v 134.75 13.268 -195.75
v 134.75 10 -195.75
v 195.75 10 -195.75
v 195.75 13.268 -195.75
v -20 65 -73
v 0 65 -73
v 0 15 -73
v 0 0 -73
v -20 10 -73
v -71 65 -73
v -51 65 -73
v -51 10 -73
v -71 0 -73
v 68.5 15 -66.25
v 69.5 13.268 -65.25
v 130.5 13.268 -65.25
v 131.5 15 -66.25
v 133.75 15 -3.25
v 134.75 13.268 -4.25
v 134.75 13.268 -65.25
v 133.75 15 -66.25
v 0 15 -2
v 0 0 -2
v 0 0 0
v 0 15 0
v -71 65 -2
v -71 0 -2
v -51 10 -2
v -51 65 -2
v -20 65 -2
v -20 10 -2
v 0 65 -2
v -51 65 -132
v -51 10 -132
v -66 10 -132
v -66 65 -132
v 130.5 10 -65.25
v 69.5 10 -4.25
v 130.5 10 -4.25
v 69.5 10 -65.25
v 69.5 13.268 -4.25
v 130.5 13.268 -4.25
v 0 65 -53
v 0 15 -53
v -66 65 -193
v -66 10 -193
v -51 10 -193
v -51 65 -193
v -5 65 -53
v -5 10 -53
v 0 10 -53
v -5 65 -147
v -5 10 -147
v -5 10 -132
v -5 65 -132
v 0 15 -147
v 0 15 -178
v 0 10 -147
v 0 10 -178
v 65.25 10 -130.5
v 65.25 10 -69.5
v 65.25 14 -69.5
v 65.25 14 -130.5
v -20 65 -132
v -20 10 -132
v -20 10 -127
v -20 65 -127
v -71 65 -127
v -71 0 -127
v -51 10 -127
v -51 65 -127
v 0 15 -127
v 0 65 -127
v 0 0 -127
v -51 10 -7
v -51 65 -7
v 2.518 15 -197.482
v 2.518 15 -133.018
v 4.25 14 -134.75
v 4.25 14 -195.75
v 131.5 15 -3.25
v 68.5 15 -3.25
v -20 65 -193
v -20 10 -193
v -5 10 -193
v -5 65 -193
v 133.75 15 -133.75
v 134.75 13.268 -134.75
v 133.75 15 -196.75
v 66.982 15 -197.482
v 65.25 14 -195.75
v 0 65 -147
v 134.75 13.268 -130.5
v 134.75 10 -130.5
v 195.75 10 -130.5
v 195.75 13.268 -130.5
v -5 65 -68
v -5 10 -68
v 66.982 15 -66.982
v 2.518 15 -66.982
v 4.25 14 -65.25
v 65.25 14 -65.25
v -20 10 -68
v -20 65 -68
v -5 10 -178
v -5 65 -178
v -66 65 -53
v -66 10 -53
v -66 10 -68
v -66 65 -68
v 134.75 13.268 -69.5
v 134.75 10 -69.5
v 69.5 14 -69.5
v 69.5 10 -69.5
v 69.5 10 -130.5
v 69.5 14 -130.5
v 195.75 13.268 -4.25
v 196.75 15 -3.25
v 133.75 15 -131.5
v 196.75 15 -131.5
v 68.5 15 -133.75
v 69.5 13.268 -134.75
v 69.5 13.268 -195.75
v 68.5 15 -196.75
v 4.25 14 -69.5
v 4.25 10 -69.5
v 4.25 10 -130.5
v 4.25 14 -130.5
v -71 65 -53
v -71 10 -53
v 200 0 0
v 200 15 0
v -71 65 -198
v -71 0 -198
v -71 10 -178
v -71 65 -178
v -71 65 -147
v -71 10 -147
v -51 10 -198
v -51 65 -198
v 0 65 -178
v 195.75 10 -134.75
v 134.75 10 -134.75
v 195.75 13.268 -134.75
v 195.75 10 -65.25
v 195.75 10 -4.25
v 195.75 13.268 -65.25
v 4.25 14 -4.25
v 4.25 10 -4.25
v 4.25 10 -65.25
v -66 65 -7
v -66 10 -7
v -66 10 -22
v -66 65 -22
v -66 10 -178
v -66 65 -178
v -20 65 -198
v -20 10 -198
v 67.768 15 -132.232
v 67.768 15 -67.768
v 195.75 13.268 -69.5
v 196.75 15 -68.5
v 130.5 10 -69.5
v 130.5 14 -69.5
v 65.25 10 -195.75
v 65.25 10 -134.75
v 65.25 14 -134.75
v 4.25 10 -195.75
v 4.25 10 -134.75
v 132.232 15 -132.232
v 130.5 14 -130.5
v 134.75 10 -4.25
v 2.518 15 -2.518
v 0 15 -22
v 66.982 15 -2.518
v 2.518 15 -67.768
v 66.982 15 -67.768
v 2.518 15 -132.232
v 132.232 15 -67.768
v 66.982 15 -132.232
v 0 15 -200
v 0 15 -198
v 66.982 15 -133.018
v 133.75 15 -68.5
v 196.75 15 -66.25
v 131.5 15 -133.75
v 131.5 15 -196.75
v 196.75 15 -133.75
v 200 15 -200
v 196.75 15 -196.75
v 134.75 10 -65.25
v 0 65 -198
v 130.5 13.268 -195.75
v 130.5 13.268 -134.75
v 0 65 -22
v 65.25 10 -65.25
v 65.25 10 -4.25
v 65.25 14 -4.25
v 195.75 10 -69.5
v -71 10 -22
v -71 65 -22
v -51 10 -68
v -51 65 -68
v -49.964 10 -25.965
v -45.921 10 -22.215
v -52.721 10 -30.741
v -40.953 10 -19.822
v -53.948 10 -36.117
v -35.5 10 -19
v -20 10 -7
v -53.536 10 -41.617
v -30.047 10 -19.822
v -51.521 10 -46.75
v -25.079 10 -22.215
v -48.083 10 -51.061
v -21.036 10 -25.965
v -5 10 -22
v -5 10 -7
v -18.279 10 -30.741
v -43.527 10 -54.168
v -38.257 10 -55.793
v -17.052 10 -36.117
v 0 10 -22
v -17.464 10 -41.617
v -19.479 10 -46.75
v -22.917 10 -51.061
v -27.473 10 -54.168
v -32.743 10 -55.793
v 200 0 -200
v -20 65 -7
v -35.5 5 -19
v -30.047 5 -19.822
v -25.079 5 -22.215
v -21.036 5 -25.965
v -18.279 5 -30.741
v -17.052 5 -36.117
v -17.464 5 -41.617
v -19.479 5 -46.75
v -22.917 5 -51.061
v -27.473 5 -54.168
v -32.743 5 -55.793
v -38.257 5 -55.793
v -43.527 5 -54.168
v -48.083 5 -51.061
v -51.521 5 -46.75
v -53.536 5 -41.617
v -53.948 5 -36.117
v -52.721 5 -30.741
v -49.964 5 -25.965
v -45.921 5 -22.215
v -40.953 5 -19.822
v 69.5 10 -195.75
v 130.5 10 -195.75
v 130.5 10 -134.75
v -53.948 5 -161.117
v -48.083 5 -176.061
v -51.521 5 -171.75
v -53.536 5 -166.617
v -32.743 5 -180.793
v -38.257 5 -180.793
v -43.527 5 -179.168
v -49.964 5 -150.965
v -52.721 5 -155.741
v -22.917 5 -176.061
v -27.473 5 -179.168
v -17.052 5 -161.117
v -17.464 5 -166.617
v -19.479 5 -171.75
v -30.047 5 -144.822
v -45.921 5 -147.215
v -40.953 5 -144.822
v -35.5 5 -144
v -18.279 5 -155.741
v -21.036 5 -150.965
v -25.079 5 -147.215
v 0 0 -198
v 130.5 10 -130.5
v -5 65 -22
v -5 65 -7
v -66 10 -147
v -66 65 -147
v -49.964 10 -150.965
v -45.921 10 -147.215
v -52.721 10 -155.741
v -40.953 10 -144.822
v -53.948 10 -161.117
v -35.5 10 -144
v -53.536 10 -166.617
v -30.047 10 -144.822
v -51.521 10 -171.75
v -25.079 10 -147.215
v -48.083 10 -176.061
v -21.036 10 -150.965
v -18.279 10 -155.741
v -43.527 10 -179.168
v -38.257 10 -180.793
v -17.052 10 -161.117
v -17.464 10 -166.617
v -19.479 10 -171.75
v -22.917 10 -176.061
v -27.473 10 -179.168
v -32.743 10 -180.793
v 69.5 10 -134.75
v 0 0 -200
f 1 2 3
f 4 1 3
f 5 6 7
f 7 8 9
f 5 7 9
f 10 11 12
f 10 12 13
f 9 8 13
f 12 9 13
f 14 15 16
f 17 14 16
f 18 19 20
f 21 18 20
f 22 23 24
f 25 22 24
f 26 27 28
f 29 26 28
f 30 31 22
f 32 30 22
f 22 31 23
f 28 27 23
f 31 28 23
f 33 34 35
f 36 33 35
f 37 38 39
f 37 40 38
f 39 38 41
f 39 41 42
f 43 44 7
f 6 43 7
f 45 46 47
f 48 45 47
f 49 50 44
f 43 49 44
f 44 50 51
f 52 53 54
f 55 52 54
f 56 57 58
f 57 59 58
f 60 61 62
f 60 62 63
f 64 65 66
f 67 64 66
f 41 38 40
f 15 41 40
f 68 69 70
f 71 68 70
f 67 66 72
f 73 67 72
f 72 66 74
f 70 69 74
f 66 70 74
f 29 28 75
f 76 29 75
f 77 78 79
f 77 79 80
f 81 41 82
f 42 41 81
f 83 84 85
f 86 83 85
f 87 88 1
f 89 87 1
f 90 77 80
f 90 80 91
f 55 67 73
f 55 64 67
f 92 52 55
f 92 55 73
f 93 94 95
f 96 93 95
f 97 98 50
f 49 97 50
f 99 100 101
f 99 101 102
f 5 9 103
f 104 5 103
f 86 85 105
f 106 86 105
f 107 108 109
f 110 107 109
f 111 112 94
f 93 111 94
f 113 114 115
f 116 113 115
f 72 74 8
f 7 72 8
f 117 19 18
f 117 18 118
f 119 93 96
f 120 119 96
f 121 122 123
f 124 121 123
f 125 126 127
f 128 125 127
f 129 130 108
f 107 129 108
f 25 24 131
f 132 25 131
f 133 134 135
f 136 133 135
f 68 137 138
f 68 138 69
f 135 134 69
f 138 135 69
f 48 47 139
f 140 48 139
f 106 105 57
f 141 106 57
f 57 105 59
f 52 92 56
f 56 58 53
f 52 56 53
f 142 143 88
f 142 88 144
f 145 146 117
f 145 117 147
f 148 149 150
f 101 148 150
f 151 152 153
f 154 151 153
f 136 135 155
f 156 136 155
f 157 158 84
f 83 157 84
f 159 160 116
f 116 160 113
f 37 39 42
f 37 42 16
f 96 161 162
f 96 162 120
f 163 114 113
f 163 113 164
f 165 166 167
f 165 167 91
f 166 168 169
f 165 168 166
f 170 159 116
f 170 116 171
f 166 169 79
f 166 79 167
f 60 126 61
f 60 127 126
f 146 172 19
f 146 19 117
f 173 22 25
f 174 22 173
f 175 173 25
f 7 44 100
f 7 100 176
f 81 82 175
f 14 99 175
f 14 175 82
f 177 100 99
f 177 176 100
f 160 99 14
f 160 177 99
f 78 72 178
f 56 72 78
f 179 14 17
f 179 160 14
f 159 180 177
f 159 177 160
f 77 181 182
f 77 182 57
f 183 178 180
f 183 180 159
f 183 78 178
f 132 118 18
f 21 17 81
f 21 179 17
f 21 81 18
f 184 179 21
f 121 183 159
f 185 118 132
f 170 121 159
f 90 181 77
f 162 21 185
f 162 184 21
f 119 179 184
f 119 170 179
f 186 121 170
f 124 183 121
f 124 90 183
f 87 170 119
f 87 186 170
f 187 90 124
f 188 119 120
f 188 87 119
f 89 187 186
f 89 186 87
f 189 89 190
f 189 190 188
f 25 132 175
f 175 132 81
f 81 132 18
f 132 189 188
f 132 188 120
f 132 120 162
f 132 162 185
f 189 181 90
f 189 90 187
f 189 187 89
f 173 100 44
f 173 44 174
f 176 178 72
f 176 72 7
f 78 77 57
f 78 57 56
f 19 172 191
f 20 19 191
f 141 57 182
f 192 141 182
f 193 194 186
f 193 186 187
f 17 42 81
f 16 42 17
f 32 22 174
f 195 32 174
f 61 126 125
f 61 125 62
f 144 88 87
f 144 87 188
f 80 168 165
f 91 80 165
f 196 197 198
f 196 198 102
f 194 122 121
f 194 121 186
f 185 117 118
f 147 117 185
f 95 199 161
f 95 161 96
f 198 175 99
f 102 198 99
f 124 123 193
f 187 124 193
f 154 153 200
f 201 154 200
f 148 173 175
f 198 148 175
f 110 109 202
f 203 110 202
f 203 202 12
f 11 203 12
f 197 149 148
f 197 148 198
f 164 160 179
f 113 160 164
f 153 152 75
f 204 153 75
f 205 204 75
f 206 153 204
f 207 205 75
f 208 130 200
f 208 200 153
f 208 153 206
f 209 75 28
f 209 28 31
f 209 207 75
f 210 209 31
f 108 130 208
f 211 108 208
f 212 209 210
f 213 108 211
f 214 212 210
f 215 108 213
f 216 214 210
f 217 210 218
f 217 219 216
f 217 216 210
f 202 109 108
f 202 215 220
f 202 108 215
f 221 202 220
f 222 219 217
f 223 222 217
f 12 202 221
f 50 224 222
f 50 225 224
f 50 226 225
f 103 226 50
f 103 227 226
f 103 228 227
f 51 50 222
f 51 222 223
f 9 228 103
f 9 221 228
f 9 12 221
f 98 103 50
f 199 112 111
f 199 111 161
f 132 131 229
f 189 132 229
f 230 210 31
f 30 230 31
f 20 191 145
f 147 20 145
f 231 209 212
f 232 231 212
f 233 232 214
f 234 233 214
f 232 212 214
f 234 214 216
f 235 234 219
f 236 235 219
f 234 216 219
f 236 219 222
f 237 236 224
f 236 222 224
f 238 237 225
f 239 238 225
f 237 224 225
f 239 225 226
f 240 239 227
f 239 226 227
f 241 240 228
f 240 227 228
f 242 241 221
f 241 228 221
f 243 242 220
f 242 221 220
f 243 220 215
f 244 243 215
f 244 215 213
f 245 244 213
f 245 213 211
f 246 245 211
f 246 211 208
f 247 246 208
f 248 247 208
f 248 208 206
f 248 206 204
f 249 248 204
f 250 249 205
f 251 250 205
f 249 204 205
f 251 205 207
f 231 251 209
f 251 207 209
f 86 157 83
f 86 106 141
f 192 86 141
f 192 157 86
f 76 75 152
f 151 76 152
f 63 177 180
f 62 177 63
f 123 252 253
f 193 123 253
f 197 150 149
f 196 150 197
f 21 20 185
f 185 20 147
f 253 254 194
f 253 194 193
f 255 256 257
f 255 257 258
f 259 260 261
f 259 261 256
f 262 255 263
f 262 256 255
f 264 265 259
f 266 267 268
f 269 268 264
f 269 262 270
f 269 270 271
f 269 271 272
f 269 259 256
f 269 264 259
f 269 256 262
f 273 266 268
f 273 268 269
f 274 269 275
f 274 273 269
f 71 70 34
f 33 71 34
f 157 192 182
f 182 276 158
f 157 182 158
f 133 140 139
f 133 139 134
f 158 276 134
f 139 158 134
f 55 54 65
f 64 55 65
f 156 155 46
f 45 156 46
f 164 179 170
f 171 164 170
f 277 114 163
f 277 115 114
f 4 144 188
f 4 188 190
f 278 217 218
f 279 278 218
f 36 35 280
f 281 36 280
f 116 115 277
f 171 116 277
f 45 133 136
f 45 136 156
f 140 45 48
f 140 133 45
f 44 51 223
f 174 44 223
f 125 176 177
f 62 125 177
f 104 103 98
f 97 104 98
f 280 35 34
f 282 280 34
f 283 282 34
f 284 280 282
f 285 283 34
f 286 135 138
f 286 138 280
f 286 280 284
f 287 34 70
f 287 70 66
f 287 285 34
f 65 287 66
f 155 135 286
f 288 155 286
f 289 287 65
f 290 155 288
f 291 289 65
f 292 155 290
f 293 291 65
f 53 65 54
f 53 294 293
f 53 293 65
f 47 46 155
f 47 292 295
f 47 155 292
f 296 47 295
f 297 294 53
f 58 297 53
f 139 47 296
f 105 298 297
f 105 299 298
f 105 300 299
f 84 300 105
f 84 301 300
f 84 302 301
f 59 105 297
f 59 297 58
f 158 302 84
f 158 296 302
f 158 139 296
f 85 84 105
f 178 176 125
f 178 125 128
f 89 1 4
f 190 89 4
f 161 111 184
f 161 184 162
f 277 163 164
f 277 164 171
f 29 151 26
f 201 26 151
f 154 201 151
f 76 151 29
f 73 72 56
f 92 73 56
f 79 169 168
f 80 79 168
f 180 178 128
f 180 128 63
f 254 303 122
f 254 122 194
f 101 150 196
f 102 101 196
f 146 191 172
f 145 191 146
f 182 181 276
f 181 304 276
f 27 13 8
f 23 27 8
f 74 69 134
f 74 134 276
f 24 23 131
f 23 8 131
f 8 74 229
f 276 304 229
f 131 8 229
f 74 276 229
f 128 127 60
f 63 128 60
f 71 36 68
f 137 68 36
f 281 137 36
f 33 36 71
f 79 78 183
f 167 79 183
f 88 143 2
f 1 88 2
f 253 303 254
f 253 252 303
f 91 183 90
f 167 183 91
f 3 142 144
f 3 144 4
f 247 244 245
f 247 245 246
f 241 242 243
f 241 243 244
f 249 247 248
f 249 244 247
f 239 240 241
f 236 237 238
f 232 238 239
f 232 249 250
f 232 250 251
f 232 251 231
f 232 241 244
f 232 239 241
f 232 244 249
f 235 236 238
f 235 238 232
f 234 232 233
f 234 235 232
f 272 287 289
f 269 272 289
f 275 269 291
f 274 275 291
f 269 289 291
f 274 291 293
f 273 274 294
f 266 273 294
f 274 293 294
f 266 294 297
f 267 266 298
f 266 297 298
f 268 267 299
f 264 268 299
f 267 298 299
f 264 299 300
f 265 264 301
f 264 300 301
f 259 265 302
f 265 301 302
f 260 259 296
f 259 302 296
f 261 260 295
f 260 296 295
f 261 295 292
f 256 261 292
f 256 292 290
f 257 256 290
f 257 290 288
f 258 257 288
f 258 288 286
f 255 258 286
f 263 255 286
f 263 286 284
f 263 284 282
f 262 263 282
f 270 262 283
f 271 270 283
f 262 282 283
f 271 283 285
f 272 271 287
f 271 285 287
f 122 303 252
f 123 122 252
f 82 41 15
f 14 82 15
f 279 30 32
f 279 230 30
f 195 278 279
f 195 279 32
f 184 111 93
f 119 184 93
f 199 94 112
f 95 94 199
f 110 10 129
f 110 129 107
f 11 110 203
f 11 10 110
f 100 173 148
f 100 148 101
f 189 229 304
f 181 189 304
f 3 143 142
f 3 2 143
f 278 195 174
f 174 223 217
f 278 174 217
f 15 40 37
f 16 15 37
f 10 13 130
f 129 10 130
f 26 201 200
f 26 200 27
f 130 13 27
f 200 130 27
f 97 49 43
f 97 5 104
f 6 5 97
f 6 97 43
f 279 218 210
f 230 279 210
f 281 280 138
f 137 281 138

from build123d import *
from OCP.BRepFilletAPI import BRepFilletAPI_MakeChamfer

# Parameters (mm, degrees)
BOARDBASE_DEPTH     = 10
SKETCH1_6_W         = 200
SKETCH1_6_H         = 200
SKETCH1_6_W_2       = 61
SKETCH1_6_H_2       = 61
PIECEHOLDERS_DEPTH  = 15
PIECESLIDEAID_SIZE  = 1
PIECESLIDEAID_SIZE2 = 1.732050808
BOSS_EXTRUDE3_DEPTH = 65
SKETCH4_R           = 18.5
CUT_EXTRUDE1_DEPTH  = 5


with BuildPart() as part:
    # Sketch1 → BoardBase (new body)
    with BuildSketch(Plane(origin=(0, 0, 0), x_dir=(1, 0, 0), z_dir=(0, 1, 0))):
        Polygon((0, 2), (0, 0), (200, 0), (200, 200), (0, 200), (0, 198), (-71, 198), (-71, 127), (0, 127), (0, 73), (-71, 73), (-71, 2), align=None)
    extrude(amount=BOARDBASE_DEPTH)

    # Sketch1<6> → PieceHolders (add)
    with BuildSketch(Plane(origin=(0, 0, 0), x_dir=(1, 0, 0), z_dir=(0, 1, 0))):
        with Locations((100, 100)):
            Rectangle(SKETCH1_6_W, SKETCH1_6_H)
        with Locations((34.75, 165.25)):
            Rectangle(SKETCH1_6_W_2, SKETCH1_6_H_2, mode=Mode.SUBTRACT)
        with Locations((100, 165.25)):
            Rectangle(SKETCH1_6_W_2, SKETCH1_6_H_2, mode=Mode.SUBTRACT)
        with Locations((165.25, 165.25)):
            Rectangle(SKETCH1_6_W_2, SKETCH1_6_H_2, mode=Mode.SUBTRACT)
        with Locations((34.75, 100)):
            Rectangle(SKETCH1_6_W_2, SKETCH1_6_H_2, mode=Mode.SUBTRACT)
        with Locations((100, 100)):
            Rectangle(SKETCH1_6_W_2, SKETCH1_6_H_2, mode=Mode.SUBTRACT)
        with Locations((165.25, 100)):
            Rectangle(SKETCH1_6_W_2, SKETCH1_6_H_2, mode=Mode.SUBTRACT)
        with Locations((34.75, 34.75)):
            Rectangle(SKETCH1_6_W_2, SKETCH1_6_H_2, mode=Mode.SUBTRACT)
        with Locations((100, 34.75)):
            Rectangle(SKETCH1_6_W_2, SKETCH1_6_H_2, mode=Mode.SUBTRACT)
        with Locations((165.25, 34.75)):
            Rectangle(SKETCH1_6_W_2, SKETCH1_6_H_2, mode=Mode.SUBTRACT)
    extrude(amount=PIECEHOLDERS_DEPTH)

    # PieceSlideAid: one chamfer whose edges measure the first distance from different faces: ONE call of the kernel's chamfer builder (chamfer() names one face for all edges)
    pieceslideaid_edges_1 = [part.edges().sort_by_distance(p)[0] for p in [
        (165.25, 15, -4.25),
        (100, 15, -4.25),
        (165.25, 15, -69.5),
        (165.25, 15, -134.75),
        (100, 15, -134.75),
        (69.5, 15, -34.75),
        (134.75, 15, -100),
        (134.75, 15, -165.25),
        (69.5, 15, -165.25),
        (134.75, 15, -34.75),
        (100, 15, -195.75),
        (130.5, 15, -165.25),
        (165.25, 15, -195.75),
        (195.75, 15, -165.25),
        (165.25, 15, -130.5),
        (195.75, 15, -100),
        (100, 15, -65.25),
        (130.5, 15, -34.75),
        (165.25, 15, -65.25),
        (195.75, 15, -34.75),
    ]]
    pieceslideaid_side_1 = [part.faces().sort_by_distance(p)[0] for p in [
        (100, 15, -2.828427125),
    ]]
    pieceslideaid_edges_2 = [part.edges().sort_by_distance(p)[0] for p in [
        (34.75, 15, -4.25),
    ]]
    pieceslideaid_side_2 = [part.faces().sort_by_distance(p)[0] for p in [
        (34.75, 12.5, -4.25),
    ]]
    pieceslideaid_edges_3 = [part.edges().sort_by_distance(p)[0] for p in [
        (100, 15, -69.5),
    ]]
    pieceslideaid_side_3 = [part.faces().sort_by_distance(p)[0] for p in [
        (100, 12.5, -69.5),
    ]]
    pieceslideaid_edges_4 = [part.edges().sort_by_distance(p)[0] for p in [
        (34.75, 15, -69.5),
    ]]
    pieceslideaid_side_4 = [part.faces().sort_by_distance(p)[0] for p in [
        (34.75, 12.5, -69.5),
    ]]
    pieceslideaid_edges_5 = [part.edges().sort_by_distance(p)[0] for p in [
        (34.75, 15, -134.75),
    ]]
    pieceslideaid_side_5 = [part.faces().sort_by_distance(p)[0] for p in [
        (34.75, 12.5, -134.75),
    ]]
    pieceslideaid_edges_6 = [part.edges().sort_by_distance(p)[0] for p in [
        (4.25, 15, -34.75),
    ]]
    pieceslideaid_side_6 = [part.faces().sort_by_distance(p)[0] for p in [
        (4.25, 12.5, -34.75),
    ]]
    pieceslideaid_edges_7 = [part.edges().sort_by_distance(p)[0] for p in [
        (69.5, 15, -100),
    ]]
    pieceslideaid_side_7 = [part.faces().sort_by_distance(p)[0] for p in [
        (69.5, 12.5, -100),
    ]]
    pieceslideaid_edges_8 = [part.edges().sort_by_distance(p)[0] for p in [
        (4.25, 15, -100),
    ]]
    pieceslideaid_side_8 = [part.faces().sort_by_distance(p)[0] for p in [
        (4.25, 12.5, -100),
    ]]
    pieceslideaid_edges_9 = [part.edges().sort_by_distance(p)[0] for p in [
        (4.25, 15, -165.25),
    ]]
    pieceslideaid_side_9 = [part.faces().sort_by_distance(p)[0] for p in [
        (4.25, 12.5, -165.25),
    ]]
    pieceslideaid_edges_10 = [part.edges().sort_by_distance(p)[0] for p in [
        (34.75, 15, -195.75),
    ]]
    pieceslideaid_side_10 = [part.faces().sort_by_distance(p)[0] for p in [
        (34.75, 12.5, -195.75),
    ]]
    pieceslideaid_edges_11 = [part.edges().sort_by_distance(p)[0] for p in [
        (65.25, 15, -165.25),
    ]]
    pieceslideaid_side_11 = [part.faces().sort_by_distance(p)[0] for p in [
        (65.25, 12.5, -165.25),
    ]]
    pieceslideaid_edges_12 = [part.edges().sort_by_distance(p)[0] for p in [
        (34.75, 15, -130.5),
    ]]
    pieceslideaid_side_12 = [part.faces().sort_by_distance(p)[0] for p in [
        (34.75, 12.5, -130.5),
    ]]
    pieceslideaid_edges_13 = [part.edges().sort_by_distance(p)[0] for p in [
        (65.25, 15, -100),
    ]]
    pieceslideaid_side_13 = [part.faces().sort_by_distance(p)[0] for p in [
        (65.25, 12.5, -100),
    ]]
    pieceslideaid_edges_14 = [part.edges().sort_by_distance(p)[0] for p in [
        (100, 15, -130.5),
    ]]
    pieceslideaid_side_14 = [part.faces().sort_by_distance(p)[0] for p in [
        (100, 12.5, -130.5),
    ]]
    pieceslideaid_edges_15 = [part.edges().sort_by_distance(p)[0] for p in [
        (130.5, 15, -100),
    ]]
    pieceslideaid_side_15 = [part.faces().sort_by_distance(p)[0] for p in [
        (130.5, 12.5, -100),
    ]]
    pieceslideaid_edges_16 = [part.edges().sort_by_distance(p)[0] for p in [
        (34.75, 15, -65.25),
    ]]
    pieceslideaid_side_16 = [part.faces().sort_by_distance(p)[0] for p in [
        (34.75, 12.5, -65.25),
    ]]
    pieceslideaid_edges_17 = [part.edges().sort_by_distance(p)[0] for p in [
        (65.25, 15, -34.75),
    ]]
    pieceslideaid_side_17 = [part.faces().sort_by_distance(p)[0] for p in [
        (65.25, 12.5, -34.75),
    ]]
    pieceslideaid = BRepFilletAPI_MakeChamfer(part.part.solid().wrapped)
    for e in pieceslideaid_edges_1:
        pieceslideaid.Add(PIECESLIDEAID_SIZE, PIECESLIDEAID_SIZE2, e.wrapped, pieceslideaid_side_1[0].wrapped)  # the first distance lies on this face
    for e in pieceslideaid_edges_2:
        pieceslideaid.Add(PIECESLIDEAID_SIZE, PIECESLIDEAID_SIZE2, e.wrapped, pieceslideaid_side_2[0].wrapped)  # the first distance lies on this face
    for e in pieceslideaid_edges_3:
        pieceslideaid.Add(PIECESLIDEAID_SIZE, PIECESLIDEAID_SIZE2, e.wrapped, pieceslideaid_side_3[0].wrapped)  # the first distance lies on this face
    for e in pieceslideaid_edges_4:
        pieceslideaid.Add(PIECESLIDEAID_SIZE, PIECESLIDEAID_SIZE2, e.wrapped, pieceslideaid_side_4[0].wrapped)  # the first distance lies on this face
    for e in pieceslideaid_edges_5:
        pieceslideaid.Add(PIECESLIDEAID_SIZE, PIECESLIDEAID_SIZE2, e.wrapped, pieceslideaid_side_5[0].wrapped)  # the first distance lies on this face
    for e in pieceslideaid_edges_6:
        pieceslideaid.Add(PIECESLIDEAID_SIZE, PIECESLIDEAID_SIZE2, e.wrapped, pieceslideaid_side_6[0].wrapped)  # the first distance lies on this face
    for e in pieceslideaid_edges_7:
        pieceslideaid.Add(PIECESLIDEAID_SIZE, PIECESLIDEAID_SIZE2, e.wrapped, pieceslideaid_side_7[0].wrapped)  # the first distance lies on this face
    for e in pieceslideaid_edges_8:
        pieceslideaid.Add(PIECESLIDEAID_SIZE, PIECESLIDEAID_SIZE2, e.wrapped, pieceslideaid_side_8[0].wrapped)  # the first distance lies on this face
    for e in pieceslideaid_edges_9:
        pieceslideaid.Add(PIECESLIDEAID_SIZE, PIECESLIDEAID_SIZE2, e.wrapped, pieceslideaid_side_9[0].wrapped)  # the first distance lies on this face
    for e in pieceslideaid_edges_10:
        pieceslideaid.Add(PIECESLIDEAID_SIZE, PIECESLIDEAID_SIZE2, e.wrapped, pieceslideaid_side_10[0].wrapped)  # the first distance lies on this face
    for e in pieceslideaid_edges_11:
        pieceslideaid.Add(PIECESLIDEAID_SIZE, PIECESLIDEAID_SIZE2, e.wrapped, pieceslideaid_side_11[0].wrapped)  # the first distance lies on this face
    for e in pieceslideaid_edges_12:
        pieceslideaid.Add(PIECESLIDEAID_SIZE, PIECESLIDEAID_SIZE2, e.wrapped, pieceslideaid_side_12[0].wrapped)  # the first distance lies on this face
    for e in pieceslideaid_edges_13:
        pieceslideaid.Add(PIECESLIDEAID_SIZE, PIECESLIDEAID_SIZE2, e.wrapped, pieceslideaid_side_13[0].wrapped)  # the first distance lies on this face
    for e in pieceslideaid_edges_14:
        pieceslideaid.Add(PIECESLIDEAID_SIZE, PIECESLIDEAID_SIZE2, e.wrapped, pieceslideaid_side_14[0].wrapped)  # the first distance lies on this face
    for e in pieceslideaid_edges_15:
        pieceslideaid.Add(PIECESLIDEAID_SIZE, PIECESLIDEAID_SIZE2, e.wrapped, pieceslideaid_side_15[0].wrapped)  # the first distance lies on this face
    for e in pieceslideaid_edges_16:
        pieceslideaid.Add(PIECESLIDEAID_SIZE, PIECESLIDEAID_SIZE2, e.wrapped, pieceslideaid_side_16[0].wrapped)  # the first distance lies on this face
    for e in pieceslideaid_edges_17:
        pieceslideaid.Add(PIECESLIDEAID_SIZE, PIECESLIDEAID_SIZE2, e.wrapped, pieceslideaid_side_17[0].wrapped)  # the first distance lies on this face
    add(Compound.cast(pieceslideaid.Shape()), mode=Mode.REPLACE)

    # Sketch1<8> → Boss-Extrude3 (add)
    with BuildSketch(Plane(origin=(0, 0, 0), x_dir=(1, 0, 0), z_dir=(0, 1, 0))):
        Polygon((-71, 127), (-51, 127), (-51, 132), (-66, 132), (-66, 147), (-71, 147), align=None)
        Polygon((-51, 193), (-51, 198), (-71, 198), (-71, 178), (-66, 178), (-66, 193), align=None)
        Polygon((0, 178), (0, 198), (-20, 198), (-20, 193), (-5, 193), (-5, 178), align=None)
        Polygon((-20, 127), (0, 127), (0, 147), (-5, 147), (-5, 132), (-20, 132), align=None)
        Polygon((-51, 68), (-51, 73), (-71, 73), (-71, 53), (-66, 53), (-66, 68), align=None)
        Polygon((-71, 2), (-51, 2), (-51, 7), (-66, 7), (-66, 22), (-71, 22), align=None)
        Polygon((-20, 2), (0, 2), (0, 22), (-5, 22), (-5, 7), (-20, 7), align=None)
        Polygon((-5, 53), (0, 53), (0, 73), (-20, 73), (-20, 68), (-5, 68), align=None)
    extrude(amount=BOSS_EXTRUDE3_DEPTH)

    # Sketch4 → Cut-Extrude1 (cut)
    with BuildSketch(Plane(origin=(0, 10, 0), x_dir=(1, 0, 0), z_dir=(0, 1, 0))):
        with Locations(Location((-35.5, 37.5, 0), (0, 0, 270))):
            Circle(SKETCH4_R)
        with Locations(Location((-35.5, 162.5, 0), (0, 0, 270))):
            Circle(SKETCH4_R)
    extrude(amount=-CUT_EXTRUDE1_DEPTH, mode=Mode.SUBTRACT)


solid = part.part
